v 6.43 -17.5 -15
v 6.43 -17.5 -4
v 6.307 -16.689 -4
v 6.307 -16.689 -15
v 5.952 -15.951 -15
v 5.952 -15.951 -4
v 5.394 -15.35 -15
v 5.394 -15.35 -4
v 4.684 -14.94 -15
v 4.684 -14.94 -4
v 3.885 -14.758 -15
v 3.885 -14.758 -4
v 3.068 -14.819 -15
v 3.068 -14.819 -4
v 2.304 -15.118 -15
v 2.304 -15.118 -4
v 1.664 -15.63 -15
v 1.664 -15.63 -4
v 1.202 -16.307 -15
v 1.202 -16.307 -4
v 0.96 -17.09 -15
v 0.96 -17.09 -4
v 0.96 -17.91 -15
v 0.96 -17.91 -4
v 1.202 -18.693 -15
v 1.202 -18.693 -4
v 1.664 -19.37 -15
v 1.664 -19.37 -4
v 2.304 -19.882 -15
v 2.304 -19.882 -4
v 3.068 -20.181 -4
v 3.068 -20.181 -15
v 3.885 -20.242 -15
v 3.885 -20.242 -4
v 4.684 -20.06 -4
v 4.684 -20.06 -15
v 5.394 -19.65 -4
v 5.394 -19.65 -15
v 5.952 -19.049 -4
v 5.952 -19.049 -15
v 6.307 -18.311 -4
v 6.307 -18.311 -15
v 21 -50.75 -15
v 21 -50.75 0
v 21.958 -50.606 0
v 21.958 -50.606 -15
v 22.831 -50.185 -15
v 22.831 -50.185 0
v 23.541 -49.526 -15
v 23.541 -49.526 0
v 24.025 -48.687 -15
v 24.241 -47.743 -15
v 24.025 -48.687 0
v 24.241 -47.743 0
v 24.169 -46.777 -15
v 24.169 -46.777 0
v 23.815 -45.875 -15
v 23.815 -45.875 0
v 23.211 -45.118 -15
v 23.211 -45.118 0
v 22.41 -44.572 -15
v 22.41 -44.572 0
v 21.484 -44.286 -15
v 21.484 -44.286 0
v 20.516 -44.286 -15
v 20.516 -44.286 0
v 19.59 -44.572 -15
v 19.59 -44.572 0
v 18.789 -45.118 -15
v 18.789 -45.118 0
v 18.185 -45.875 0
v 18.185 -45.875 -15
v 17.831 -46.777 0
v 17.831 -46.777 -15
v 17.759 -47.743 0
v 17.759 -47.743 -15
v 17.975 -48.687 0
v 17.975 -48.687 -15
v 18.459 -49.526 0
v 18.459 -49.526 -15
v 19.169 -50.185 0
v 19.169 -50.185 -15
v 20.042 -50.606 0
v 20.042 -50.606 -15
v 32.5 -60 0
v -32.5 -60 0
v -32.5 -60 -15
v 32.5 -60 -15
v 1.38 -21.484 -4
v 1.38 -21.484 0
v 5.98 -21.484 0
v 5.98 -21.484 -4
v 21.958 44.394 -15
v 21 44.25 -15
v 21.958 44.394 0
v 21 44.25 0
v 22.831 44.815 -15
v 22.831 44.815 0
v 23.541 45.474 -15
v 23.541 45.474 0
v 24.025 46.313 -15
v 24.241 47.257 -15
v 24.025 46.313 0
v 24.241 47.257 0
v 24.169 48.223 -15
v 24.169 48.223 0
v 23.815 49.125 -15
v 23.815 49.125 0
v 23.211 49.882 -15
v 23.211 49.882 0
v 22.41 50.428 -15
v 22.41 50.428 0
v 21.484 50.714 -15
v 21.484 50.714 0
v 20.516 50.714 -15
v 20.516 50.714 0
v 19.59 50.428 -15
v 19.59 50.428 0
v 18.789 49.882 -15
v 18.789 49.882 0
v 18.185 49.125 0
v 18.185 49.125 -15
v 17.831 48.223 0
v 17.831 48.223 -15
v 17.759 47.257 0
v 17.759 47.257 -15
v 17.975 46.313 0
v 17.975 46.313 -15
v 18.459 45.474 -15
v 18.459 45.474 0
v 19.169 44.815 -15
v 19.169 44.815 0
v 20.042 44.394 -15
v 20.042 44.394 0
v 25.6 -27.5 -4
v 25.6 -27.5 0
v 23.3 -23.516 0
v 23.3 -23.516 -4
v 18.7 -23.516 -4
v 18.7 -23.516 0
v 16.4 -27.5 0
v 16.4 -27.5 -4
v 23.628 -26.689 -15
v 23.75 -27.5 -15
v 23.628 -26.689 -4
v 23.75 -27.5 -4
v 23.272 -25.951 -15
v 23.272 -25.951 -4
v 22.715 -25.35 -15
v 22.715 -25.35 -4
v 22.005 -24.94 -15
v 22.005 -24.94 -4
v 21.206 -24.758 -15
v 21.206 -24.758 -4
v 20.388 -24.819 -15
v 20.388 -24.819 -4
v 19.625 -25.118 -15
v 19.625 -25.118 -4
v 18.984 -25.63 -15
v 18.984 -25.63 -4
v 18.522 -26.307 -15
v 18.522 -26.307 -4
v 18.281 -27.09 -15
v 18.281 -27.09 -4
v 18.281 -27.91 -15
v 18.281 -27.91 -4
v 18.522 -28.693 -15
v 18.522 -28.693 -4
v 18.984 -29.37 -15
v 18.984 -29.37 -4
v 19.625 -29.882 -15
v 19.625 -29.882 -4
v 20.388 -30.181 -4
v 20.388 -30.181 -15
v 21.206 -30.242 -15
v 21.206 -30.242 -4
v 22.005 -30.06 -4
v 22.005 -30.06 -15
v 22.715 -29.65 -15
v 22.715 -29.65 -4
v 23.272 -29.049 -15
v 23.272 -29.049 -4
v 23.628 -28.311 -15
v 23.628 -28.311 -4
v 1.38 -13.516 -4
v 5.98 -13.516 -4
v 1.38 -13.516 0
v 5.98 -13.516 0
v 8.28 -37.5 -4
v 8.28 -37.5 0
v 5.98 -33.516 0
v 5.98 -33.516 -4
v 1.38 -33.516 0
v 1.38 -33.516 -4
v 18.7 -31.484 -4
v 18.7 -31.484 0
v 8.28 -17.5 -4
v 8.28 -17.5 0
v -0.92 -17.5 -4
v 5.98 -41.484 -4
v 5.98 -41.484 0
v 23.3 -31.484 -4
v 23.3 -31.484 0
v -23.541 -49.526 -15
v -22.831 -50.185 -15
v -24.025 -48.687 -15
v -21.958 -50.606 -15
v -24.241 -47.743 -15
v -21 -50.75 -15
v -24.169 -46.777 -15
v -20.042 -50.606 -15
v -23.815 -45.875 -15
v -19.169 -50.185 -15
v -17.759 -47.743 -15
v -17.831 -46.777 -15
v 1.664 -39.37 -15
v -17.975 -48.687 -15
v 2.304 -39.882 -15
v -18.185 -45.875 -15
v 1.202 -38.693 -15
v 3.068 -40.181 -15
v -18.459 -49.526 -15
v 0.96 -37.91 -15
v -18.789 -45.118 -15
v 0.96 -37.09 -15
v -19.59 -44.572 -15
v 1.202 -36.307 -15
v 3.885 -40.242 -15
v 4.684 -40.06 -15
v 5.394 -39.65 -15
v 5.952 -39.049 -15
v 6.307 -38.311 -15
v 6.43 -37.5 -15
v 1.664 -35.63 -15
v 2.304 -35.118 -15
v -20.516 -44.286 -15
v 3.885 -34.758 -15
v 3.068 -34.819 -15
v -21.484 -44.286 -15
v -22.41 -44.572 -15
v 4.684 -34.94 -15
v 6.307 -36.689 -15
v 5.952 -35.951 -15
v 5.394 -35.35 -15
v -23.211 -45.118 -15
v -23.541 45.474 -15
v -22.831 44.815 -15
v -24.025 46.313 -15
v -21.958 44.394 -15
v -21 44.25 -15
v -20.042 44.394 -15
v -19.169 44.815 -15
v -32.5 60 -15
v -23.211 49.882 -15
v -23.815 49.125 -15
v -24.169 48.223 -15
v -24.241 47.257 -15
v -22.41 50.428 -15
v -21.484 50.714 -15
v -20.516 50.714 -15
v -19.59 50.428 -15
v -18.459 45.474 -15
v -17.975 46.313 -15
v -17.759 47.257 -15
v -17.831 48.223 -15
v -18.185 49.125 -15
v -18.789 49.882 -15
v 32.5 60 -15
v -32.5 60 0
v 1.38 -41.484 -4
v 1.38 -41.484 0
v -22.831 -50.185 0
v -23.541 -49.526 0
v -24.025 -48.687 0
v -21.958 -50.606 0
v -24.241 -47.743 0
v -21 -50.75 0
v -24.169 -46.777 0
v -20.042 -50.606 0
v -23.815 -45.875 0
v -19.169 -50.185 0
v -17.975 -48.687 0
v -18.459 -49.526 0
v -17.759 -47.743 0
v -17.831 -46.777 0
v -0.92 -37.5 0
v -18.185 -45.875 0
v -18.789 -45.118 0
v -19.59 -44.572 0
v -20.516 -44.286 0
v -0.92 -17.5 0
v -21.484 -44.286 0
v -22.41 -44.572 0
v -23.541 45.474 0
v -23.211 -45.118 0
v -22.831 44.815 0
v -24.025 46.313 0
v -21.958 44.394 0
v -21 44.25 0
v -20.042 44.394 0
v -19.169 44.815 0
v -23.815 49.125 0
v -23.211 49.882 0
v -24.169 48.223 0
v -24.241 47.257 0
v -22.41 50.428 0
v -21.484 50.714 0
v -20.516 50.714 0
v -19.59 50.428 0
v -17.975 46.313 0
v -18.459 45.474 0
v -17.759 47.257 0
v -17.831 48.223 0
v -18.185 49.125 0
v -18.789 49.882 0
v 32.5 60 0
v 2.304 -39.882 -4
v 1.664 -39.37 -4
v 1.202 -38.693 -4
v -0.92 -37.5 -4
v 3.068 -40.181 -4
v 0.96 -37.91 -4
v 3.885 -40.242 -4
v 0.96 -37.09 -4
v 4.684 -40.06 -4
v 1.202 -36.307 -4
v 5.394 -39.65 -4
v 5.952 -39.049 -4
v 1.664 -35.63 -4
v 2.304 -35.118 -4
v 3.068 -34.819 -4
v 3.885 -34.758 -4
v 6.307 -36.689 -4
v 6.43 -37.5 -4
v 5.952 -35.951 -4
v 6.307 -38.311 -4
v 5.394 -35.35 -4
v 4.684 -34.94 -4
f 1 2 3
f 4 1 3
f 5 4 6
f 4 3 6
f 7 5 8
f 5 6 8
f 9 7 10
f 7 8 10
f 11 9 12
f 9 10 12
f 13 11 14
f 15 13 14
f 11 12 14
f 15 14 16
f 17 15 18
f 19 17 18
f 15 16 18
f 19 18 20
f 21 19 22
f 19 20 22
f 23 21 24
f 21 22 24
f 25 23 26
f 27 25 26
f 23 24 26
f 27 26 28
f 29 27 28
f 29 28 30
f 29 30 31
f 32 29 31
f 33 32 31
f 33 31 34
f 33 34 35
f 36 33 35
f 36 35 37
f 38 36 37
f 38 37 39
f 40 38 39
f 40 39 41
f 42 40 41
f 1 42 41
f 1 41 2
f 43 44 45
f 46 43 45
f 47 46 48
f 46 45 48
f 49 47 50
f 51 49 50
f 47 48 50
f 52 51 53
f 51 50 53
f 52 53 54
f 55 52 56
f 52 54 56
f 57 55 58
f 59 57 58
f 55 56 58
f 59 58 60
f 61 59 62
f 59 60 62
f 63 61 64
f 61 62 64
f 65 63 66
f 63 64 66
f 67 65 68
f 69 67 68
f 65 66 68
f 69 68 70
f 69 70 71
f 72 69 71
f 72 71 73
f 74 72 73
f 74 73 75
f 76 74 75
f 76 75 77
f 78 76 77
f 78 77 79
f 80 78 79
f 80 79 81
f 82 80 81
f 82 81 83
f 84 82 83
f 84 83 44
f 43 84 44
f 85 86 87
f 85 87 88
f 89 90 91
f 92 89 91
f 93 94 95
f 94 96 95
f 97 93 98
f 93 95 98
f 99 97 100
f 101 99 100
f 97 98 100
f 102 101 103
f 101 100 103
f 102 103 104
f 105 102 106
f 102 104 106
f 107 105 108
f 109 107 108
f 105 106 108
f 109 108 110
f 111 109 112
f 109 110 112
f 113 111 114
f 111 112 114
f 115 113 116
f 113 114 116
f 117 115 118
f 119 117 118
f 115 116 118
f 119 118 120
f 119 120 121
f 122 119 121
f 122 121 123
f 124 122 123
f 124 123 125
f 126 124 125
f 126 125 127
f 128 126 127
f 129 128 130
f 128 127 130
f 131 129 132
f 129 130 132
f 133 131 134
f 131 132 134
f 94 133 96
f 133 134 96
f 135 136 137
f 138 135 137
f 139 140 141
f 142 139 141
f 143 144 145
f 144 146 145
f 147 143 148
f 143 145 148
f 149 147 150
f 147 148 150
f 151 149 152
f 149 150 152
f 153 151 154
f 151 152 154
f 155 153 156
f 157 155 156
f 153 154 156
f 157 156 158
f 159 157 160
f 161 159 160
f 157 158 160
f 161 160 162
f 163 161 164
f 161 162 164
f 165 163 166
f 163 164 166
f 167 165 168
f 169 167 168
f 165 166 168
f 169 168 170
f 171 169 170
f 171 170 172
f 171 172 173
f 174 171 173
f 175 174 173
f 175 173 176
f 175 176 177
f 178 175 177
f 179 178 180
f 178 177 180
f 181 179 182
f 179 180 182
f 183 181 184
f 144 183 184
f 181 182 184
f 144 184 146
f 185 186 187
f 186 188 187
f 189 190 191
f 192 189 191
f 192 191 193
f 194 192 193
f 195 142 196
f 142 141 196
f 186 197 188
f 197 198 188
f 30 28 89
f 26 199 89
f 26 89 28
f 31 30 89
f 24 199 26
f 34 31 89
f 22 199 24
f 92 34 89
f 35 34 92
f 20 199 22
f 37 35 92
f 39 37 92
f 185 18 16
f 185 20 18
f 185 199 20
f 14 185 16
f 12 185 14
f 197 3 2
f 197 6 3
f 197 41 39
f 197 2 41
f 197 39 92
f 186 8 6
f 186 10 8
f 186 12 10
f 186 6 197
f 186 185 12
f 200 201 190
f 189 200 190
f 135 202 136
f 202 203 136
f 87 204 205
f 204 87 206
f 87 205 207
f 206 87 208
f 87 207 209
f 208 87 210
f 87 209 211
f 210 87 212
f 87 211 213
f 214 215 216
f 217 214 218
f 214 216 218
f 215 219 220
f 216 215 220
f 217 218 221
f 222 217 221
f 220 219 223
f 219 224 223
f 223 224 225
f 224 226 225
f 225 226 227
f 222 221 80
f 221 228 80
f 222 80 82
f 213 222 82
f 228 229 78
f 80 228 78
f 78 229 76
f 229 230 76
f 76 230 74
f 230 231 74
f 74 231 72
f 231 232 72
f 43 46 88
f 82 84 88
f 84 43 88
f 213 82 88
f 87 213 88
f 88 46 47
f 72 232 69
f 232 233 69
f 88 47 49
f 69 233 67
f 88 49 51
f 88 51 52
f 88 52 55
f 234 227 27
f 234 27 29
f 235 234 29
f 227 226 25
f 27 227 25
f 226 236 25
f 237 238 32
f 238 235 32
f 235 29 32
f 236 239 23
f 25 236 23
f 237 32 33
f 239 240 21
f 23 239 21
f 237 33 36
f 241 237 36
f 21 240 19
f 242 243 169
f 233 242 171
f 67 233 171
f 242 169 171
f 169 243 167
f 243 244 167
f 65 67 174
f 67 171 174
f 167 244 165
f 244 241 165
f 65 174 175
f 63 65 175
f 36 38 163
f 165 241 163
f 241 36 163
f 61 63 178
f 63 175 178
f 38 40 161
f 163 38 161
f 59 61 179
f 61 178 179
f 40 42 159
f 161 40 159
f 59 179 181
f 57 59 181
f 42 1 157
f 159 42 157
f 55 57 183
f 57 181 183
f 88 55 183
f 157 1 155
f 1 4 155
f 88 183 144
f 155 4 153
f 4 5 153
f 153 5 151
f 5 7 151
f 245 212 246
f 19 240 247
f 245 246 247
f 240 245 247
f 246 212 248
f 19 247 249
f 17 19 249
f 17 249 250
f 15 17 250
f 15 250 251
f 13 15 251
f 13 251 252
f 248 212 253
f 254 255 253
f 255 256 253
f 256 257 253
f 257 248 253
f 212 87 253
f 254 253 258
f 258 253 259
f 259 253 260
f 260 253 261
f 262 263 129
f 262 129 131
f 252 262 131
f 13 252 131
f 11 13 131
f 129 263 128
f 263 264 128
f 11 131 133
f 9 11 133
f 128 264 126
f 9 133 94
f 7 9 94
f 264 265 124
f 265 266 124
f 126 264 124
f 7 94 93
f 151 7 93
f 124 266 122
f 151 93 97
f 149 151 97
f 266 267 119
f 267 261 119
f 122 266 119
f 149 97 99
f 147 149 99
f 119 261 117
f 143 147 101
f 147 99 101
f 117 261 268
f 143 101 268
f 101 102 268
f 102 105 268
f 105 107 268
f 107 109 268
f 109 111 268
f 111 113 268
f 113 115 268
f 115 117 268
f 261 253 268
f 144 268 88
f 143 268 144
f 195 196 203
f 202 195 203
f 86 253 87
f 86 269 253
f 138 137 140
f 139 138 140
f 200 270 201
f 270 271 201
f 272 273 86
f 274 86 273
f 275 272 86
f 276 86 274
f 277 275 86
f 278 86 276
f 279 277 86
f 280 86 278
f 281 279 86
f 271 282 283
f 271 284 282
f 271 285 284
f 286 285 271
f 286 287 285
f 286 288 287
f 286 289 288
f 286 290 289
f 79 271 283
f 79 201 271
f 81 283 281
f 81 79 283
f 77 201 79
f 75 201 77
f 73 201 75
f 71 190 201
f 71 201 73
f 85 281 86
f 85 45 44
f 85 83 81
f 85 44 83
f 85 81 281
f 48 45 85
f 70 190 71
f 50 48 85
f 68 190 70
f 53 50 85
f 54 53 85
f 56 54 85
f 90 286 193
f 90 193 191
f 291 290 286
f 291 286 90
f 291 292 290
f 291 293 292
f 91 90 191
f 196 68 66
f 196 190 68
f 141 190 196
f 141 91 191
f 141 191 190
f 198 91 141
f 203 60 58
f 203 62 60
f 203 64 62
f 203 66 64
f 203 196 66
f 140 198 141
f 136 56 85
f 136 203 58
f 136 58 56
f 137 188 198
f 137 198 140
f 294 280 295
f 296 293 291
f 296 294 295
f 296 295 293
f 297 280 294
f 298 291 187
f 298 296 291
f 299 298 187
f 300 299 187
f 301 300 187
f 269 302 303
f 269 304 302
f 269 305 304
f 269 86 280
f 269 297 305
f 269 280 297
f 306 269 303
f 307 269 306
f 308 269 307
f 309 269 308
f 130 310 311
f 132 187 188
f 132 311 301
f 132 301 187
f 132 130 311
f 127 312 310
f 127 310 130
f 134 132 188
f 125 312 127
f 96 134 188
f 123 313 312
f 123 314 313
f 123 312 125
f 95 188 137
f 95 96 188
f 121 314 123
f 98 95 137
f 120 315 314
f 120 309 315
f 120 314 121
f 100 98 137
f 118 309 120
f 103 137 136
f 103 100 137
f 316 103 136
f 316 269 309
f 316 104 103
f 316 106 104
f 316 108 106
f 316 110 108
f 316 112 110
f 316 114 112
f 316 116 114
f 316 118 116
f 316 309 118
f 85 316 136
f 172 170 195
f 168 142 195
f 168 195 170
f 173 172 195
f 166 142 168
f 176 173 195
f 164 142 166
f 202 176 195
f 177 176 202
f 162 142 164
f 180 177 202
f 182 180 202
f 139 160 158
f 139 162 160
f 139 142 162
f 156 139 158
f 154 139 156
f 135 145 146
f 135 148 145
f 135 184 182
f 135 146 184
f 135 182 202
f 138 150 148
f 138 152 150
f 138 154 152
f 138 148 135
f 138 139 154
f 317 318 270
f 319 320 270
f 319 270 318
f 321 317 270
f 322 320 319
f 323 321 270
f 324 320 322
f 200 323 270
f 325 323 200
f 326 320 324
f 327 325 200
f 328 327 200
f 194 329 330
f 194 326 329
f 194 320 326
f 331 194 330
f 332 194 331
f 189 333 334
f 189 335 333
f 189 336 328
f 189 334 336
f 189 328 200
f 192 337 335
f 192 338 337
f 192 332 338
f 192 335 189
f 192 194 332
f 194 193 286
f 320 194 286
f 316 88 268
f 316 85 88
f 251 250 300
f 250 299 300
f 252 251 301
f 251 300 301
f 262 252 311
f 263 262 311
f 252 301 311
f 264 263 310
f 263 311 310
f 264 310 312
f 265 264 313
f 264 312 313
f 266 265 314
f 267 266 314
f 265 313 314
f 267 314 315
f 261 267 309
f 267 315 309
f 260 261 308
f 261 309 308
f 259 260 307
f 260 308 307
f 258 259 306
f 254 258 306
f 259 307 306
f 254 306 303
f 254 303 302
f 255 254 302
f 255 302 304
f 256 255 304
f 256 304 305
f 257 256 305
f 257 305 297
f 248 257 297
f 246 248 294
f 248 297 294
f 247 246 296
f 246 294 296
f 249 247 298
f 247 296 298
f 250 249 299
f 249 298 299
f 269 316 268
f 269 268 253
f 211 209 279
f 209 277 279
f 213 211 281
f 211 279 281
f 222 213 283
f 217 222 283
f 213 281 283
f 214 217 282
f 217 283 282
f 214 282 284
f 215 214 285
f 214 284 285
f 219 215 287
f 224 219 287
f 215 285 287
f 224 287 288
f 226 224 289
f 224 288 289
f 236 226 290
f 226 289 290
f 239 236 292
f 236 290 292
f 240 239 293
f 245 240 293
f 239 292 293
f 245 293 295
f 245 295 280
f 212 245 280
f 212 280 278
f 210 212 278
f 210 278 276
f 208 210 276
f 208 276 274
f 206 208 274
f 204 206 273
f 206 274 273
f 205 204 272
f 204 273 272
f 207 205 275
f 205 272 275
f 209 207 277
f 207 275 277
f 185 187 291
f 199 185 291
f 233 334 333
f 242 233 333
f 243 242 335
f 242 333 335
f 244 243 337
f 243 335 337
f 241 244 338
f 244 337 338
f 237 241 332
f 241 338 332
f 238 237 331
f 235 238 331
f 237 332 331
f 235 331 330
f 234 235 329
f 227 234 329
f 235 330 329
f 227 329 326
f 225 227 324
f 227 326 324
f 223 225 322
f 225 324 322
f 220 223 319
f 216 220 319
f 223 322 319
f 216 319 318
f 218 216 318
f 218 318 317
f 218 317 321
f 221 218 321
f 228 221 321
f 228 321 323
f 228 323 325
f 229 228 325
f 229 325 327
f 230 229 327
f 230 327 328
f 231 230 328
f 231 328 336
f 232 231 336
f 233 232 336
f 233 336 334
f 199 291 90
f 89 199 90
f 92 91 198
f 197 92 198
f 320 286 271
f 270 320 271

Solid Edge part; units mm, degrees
sketch "Sketch1" plane through (0, 0, 0) normal (0, 0, 1) x (1, 0, 0)
  line L0 (32.5, 60) -> (-32.5, 60)
  line L1 (-32.5, 60) -> (-32.5, -60)
  line L2 (-32.5, -60) -> (32.5, -60)
  line L3 (32.5, -60) -> (32.5, 60)
extrude "Protrusion1" add sketch "Sketch1" against normal blind 15
sketch "Sketch2" plane through (0, 0, 0) normal (0, 0, 1) x (0, -1, 0)
  circle A0 centre (-47.5, 21) radius 3.25
  circle A1 centre (-47.5, -21) radius 3.25
  circle A2 centre (47.5, 21) radius 3.25
  circle A3 centre (47.5, -21) radius 3.25
  dimension "D1" = 6.5
extrude "ExtrudedCutout_1" cut sketch "Sketch2" against normal blind 309.8
sketch "Sketch3" plane through (0, 0, 0) normal (0, 0, 1) x (1, 0, 0)
  line L0 (8.2795, -37.5) -> (5.9795, -33.5163)
  line L1 (5.9795, -33.5163) -> (1.3795, -33.5163)
  line L2 (1.3795, -33.5163) -> (-0.9205, -37.5)
  line L3 (-0.9205, -37.5) -> (1.3795, -41.4837)
  line L4 (1.3795, -41.4837) -> (5.9795, -41.4837)
  line L5 (5.9795, -41.4837) -> (8.2795, -37.5)
  line L6 (18.7, -23.5163) -> (16.4, -27.5)
  line L7 (16.4, -27.5) -> (18.7, -31.4837)
  line L8 (18.7, -31.4837) -> (23.3, -31.4837)
  line L9 (23.3, -31.4837) -> (25.6, -27.5)
  line L10 (25.6, -27.5) -> (23.3, -23.5163)
  line L11 (23.3, -23.5163) -> (18.7, -23.5163)
  line L12 (5.9795, -21.4837) -> (8.2795, -17.5)
  line L13 (8.2795, -17.5) -> (5.9795, -13.5163)
  line L14 (5.9795, -13.5163) -> (1.3795, -13.5163)
  line L15 (1.3795, -13.5163) -> (-0.9205, -17.5)
  line L16 (-0.9205, -17.5) -> (1.3795, -21.4837)
  line L17 (1.3795, -21.4837) -> (5.9795, -21.4837)
  dimension "D1" = 40
  dimension "D2" = 5.5
  dimension "D3" = 5.5
  dimension "D4" = 20
  dimension "D5" = 20
  dimension "D6" = 20
  dimension "D7" = 5.5
extrude "ExtrudedCutout_2" cut sketch "Sketch3" against normal blind 4
sketch "Sketch4" plane through (0, 0, 0) normal (0, 0, 1) x (1, 0, 0)
  circle A0 centre (3.6795, -17.5) radius 2.75
  circle A1 centre (21, -27.5) radius 2.75
  circle A2 centre (3.6795, -37.5) radius 2.75
  dimension "D1" = 40
  dimension "D2" = 5.5
  dimension "D3" = 5.5
  dimension "D4" = 20
  dimension "D5" = 20
  dimension "D6" = 20
  dimension "D7" = 5.5
extrude "ExtrudedCutout_3" cut sketch "Sketch4" against normal blind 54.7
